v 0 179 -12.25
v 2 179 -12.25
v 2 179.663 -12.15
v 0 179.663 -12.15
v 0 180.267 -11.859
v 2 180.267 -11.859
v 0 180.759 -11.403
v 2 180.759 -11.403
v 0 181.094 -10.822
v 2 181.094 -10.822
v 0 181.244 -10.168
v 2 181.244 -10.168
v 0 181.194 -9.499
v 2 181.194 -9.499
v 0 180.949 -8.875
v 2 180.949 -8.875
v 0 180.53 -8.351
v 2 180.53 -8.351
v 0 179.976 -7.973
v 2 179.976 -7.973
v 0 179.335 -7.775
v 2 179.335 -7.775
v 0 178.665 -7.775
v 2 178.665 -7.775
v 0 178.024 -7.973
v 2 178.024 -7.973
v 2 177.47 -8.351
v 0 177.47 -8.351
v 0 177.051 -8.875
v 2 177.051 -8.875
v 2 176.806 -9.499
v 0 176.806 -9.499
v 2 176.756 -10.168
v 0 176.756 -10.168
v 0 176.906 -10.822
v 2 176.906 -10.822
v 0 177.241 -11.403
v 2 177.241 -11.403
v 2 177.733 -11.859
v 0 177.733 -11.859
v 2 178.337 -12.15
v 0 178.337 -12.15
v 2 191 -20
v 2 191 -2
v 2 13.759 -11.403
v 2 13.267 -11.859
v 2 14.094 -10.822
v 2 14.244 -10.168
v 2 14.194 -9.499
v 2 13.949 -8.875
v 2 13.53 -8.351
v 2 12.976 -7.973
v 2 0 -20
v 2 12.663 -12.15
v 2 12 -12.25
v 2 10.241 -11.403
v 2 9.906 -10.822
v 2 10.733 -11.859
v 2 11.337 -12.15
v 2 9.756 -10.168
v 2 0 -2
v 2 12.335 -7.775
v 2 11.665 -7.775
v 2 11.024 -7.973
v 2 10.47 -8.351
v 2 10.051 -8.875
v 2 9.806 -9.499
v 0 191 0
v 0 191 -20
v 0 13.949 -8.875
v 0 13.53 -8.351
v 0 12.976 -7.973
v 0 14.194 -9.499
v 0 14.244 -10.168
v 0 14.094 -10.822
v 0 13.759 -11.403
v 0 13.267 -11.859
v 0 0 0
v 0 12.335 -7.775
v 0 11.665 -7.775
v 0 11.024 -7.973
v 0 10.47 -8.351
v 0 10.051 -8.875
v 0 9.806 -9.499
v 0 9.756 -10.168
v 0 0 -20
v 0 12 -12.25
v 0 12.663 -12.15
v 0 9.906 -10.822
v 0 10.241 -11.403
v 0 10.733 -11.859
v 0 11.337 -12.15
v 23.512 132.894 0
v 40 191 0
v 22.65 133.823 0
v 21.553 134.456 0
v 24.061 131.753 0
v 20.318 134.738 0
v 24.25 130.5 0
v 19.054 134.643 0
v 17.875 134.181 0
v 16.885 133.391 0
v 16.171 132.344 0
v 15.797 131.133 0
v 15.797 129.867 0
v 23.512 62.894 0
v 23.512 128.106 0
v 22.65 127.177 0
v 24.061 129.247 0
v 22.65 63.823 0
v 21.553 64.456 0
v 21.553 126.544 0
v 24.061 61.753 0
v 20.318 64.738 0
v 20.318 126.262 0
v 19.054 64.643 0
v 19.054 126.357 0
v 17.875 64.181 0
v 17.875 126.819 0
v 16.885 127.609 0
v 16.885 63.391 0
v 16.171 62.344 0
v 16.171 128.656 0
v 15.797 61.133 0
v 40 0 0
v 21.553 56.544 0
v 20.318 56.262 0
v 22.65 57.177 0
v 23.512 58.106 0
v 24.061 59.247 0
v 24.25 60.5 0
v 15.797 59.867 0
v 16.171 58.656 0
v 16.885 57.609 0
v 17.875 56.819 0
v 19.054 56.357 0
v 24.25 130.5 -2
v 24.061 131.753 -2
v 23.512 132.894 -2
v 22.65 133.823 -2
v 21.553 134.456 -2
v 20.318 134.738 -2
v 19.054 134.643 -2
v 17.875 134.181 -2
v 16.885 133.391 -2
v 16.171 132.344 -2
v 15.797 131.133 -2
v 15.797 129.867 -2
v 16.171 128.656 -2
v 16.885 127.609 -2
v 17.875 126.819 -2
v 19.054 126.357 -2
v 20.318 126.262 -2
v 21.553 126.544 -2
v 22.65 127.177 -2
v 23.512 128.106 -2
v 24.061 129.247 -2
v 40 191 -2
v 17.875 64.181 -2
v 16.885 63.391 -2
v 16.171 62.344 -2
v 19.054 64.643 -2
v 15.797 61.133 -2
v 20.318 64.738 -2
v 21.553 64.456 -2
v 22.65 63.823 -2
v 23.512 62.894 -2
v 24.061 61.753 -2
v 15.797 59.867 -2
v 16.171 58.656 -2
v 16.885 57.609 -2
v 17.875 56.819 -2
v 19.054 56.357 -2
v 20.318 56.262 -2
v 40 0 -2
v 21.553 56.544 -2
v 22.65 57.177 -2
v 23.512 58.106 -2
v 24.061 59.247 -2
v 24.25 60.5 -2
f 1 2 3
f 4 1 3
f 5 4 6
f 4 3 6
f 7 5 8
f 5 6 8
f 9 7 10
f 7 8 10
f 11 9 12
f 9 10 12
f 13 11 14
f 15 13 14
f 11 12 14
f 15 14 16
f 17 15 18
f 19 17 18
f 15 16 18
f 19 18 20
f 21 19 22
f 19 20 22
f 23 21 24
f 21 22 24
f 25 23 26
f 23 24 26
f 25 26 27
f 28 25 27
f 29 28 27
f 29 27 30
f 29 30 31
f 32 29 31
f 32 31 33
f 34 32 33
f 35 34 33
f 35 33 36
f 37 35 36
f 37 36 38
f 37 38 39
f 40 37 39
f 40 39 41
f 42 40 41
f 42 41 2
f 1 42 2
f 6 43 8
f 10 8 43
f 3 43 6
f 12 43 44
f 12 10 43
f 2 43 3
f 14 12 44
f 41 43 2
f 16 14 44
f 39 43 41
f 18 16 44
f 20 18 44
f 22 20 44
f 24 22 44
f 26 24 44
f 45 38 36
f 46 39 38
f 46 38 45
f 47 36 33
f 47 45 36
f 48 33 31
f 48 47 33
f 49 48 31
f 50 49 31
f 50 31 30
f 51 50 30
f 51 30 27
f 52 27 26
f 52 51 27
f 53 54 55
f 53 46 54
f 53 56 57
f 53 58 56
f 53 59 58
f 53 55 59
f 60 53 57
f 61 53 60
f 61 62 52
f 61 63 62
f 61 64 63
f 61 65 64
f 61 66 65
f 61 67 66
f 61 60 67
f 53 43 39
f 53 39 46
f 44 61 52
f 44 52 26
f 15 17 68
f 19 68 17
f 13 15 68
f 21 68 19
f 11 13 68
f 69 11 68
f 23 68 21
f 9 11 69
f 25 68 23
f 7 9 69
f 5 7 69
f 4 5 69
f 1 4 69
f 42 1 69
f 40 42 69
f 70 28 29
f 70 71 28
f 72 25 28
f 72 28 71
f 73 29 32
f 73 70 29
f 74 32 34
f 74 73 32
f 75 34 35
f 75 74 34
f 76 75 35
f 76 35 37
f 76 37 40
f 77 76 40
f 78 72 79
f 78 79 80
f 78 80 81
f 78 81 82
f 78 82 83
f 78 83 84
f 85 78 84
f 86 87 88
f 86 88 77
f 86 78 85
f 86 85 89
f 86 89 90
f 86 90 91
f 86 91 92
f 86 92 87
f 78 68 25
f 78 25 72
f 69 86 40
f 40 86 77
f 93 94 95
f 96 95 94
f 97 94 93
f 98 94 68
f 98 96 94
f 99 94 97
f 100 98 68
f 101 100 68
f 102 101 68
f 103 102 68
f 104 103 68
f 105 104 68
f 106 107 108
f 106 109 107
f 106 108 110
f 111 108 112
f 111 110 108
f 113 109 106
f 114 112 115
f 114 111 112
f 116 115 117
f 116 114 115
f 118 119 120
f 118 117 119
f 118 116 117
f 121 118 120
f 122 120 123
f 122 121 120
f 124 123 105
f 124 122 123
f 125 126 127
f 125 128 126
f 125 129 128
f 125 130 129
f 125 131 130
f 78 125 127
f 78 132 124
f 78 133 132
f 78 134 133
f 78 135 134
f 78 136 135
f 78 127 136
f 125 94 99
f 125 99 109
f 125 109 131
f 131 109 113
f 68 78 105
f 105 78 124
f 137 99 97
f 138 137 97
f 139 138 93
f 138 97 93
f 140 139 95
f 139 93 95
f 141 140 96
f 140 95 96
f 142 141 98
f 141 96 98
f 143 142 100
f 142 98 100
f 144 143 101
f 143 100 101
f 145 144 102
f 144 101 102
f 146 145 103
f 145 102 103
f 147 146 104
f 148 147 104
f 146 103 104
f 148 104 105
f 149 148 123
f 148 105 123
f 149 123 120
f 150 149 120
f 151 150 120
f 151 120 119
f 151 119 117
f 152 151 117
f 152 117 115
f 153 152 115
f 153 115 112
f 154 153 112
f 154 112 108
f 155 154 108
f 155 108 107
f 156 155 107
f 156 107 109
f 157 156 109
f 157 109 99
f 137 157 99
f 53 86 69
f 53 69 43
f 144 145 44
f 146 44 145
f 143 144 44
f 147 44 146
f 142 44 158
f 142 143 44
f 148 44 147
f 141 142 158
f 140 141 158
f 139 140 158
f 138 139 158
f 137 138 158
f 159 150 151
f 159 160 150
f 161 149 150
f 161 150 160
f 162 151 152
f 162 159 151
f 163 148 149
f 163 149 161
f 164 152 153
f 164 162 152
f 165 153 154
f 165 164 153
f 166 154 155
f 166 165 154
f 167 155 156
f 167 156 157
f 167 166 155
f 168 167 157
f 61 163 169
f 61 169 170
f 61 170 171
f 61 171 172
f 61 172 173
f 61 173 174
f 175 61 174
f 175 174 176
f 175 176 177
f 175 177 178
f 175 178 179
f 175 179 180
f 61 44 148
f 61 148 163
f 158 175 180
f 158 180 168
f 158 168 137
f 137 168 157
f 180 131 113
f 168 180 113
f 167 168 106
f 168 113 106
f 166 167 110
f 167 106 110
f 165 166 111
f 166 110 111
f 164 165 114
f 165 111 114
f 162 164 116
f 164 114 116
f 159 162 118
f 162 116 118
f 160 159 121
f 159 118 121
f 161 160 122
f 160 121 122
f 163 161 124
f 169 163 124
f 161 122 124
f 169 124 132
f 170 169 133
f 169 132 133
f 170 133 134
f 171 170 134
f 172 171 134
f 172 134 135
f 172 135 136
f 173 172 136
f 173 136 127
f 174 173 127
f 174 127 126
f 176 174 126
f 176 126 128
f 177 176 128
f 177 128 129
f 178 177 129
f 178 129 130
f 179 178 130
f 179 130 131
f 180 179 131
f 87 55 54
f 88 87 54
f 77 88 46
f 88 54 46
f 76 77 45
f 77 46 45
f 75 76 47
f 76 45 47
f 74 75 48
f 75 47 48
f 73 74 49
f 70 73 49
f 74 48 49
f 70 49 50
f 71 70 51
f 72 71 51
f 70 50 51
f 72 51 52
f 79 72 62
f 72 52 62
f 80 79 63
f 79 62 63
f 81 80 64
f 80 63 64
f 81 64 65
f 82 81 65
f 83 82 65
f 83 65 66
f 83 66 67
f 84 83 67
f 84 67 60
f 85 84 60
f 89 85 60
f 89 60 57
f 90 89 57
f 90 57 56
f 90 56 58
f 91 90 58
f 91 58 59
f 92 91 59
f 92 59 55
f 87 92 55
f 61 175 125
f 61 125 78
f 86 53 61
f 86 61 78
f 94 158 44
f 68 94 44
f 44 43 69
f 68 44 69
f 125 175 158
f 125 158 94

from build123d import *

# Parameters (mm, degrees)
EXTRUDE_1_DEPTH     = 191
SKETCH_2_R          = 4.25
CUT_EXTRUDE_1_DEPTH = 21
SKETCH_3_R          = 2.25
CUT_EXTRUDE_2_DEPTH = 3


with BuildPart() as part:
    # Эскиз1 → Бобышка-Вытянуть1 (new body)
    with BuildSketch(Plane(origin=(0, 0, 0), x_dir=(1, 0, 0), z_dir=(0, 1, 0))):
        Polygon((0, 0), (0, 20), (2, 20), (2, 2), (40, 2), (40, 0), align=None)
    extrude(amount=EXTRUDE_1_DEPTH)

    # Эскиз2 → Вырез-Вытянуть1 (cut, through all)
    with BuildSketch(Plane.XY):
        with Locations((20, 130.5)):
            Circle(SKETCH_2_R)
        with Locations((20, 60.5)):
            Circle(SKETCH_2_R)
    extrude(amount=-CUT_EXTRUDE_1_DEPTH, mode=Mode.SUBTRACT)

    # Эскиз3 → Вырез-Вытянуть2 (cut, through all)
    with BuildSketch(Plane(origin=(2, 0, 0), x_dir=(0, 0, -1), z_dir=(1, 0, 0))):
        with Locations((10, 12)):
            Circle(SKETCH_3_R)
        with Locations((10, 179)):
            Circle(SKETCH_3_R)
    extrude(amount=-CUT_EXTRUDE_2_DEPTH, mode=Mode.SUBTRACT)


solid = part.part
